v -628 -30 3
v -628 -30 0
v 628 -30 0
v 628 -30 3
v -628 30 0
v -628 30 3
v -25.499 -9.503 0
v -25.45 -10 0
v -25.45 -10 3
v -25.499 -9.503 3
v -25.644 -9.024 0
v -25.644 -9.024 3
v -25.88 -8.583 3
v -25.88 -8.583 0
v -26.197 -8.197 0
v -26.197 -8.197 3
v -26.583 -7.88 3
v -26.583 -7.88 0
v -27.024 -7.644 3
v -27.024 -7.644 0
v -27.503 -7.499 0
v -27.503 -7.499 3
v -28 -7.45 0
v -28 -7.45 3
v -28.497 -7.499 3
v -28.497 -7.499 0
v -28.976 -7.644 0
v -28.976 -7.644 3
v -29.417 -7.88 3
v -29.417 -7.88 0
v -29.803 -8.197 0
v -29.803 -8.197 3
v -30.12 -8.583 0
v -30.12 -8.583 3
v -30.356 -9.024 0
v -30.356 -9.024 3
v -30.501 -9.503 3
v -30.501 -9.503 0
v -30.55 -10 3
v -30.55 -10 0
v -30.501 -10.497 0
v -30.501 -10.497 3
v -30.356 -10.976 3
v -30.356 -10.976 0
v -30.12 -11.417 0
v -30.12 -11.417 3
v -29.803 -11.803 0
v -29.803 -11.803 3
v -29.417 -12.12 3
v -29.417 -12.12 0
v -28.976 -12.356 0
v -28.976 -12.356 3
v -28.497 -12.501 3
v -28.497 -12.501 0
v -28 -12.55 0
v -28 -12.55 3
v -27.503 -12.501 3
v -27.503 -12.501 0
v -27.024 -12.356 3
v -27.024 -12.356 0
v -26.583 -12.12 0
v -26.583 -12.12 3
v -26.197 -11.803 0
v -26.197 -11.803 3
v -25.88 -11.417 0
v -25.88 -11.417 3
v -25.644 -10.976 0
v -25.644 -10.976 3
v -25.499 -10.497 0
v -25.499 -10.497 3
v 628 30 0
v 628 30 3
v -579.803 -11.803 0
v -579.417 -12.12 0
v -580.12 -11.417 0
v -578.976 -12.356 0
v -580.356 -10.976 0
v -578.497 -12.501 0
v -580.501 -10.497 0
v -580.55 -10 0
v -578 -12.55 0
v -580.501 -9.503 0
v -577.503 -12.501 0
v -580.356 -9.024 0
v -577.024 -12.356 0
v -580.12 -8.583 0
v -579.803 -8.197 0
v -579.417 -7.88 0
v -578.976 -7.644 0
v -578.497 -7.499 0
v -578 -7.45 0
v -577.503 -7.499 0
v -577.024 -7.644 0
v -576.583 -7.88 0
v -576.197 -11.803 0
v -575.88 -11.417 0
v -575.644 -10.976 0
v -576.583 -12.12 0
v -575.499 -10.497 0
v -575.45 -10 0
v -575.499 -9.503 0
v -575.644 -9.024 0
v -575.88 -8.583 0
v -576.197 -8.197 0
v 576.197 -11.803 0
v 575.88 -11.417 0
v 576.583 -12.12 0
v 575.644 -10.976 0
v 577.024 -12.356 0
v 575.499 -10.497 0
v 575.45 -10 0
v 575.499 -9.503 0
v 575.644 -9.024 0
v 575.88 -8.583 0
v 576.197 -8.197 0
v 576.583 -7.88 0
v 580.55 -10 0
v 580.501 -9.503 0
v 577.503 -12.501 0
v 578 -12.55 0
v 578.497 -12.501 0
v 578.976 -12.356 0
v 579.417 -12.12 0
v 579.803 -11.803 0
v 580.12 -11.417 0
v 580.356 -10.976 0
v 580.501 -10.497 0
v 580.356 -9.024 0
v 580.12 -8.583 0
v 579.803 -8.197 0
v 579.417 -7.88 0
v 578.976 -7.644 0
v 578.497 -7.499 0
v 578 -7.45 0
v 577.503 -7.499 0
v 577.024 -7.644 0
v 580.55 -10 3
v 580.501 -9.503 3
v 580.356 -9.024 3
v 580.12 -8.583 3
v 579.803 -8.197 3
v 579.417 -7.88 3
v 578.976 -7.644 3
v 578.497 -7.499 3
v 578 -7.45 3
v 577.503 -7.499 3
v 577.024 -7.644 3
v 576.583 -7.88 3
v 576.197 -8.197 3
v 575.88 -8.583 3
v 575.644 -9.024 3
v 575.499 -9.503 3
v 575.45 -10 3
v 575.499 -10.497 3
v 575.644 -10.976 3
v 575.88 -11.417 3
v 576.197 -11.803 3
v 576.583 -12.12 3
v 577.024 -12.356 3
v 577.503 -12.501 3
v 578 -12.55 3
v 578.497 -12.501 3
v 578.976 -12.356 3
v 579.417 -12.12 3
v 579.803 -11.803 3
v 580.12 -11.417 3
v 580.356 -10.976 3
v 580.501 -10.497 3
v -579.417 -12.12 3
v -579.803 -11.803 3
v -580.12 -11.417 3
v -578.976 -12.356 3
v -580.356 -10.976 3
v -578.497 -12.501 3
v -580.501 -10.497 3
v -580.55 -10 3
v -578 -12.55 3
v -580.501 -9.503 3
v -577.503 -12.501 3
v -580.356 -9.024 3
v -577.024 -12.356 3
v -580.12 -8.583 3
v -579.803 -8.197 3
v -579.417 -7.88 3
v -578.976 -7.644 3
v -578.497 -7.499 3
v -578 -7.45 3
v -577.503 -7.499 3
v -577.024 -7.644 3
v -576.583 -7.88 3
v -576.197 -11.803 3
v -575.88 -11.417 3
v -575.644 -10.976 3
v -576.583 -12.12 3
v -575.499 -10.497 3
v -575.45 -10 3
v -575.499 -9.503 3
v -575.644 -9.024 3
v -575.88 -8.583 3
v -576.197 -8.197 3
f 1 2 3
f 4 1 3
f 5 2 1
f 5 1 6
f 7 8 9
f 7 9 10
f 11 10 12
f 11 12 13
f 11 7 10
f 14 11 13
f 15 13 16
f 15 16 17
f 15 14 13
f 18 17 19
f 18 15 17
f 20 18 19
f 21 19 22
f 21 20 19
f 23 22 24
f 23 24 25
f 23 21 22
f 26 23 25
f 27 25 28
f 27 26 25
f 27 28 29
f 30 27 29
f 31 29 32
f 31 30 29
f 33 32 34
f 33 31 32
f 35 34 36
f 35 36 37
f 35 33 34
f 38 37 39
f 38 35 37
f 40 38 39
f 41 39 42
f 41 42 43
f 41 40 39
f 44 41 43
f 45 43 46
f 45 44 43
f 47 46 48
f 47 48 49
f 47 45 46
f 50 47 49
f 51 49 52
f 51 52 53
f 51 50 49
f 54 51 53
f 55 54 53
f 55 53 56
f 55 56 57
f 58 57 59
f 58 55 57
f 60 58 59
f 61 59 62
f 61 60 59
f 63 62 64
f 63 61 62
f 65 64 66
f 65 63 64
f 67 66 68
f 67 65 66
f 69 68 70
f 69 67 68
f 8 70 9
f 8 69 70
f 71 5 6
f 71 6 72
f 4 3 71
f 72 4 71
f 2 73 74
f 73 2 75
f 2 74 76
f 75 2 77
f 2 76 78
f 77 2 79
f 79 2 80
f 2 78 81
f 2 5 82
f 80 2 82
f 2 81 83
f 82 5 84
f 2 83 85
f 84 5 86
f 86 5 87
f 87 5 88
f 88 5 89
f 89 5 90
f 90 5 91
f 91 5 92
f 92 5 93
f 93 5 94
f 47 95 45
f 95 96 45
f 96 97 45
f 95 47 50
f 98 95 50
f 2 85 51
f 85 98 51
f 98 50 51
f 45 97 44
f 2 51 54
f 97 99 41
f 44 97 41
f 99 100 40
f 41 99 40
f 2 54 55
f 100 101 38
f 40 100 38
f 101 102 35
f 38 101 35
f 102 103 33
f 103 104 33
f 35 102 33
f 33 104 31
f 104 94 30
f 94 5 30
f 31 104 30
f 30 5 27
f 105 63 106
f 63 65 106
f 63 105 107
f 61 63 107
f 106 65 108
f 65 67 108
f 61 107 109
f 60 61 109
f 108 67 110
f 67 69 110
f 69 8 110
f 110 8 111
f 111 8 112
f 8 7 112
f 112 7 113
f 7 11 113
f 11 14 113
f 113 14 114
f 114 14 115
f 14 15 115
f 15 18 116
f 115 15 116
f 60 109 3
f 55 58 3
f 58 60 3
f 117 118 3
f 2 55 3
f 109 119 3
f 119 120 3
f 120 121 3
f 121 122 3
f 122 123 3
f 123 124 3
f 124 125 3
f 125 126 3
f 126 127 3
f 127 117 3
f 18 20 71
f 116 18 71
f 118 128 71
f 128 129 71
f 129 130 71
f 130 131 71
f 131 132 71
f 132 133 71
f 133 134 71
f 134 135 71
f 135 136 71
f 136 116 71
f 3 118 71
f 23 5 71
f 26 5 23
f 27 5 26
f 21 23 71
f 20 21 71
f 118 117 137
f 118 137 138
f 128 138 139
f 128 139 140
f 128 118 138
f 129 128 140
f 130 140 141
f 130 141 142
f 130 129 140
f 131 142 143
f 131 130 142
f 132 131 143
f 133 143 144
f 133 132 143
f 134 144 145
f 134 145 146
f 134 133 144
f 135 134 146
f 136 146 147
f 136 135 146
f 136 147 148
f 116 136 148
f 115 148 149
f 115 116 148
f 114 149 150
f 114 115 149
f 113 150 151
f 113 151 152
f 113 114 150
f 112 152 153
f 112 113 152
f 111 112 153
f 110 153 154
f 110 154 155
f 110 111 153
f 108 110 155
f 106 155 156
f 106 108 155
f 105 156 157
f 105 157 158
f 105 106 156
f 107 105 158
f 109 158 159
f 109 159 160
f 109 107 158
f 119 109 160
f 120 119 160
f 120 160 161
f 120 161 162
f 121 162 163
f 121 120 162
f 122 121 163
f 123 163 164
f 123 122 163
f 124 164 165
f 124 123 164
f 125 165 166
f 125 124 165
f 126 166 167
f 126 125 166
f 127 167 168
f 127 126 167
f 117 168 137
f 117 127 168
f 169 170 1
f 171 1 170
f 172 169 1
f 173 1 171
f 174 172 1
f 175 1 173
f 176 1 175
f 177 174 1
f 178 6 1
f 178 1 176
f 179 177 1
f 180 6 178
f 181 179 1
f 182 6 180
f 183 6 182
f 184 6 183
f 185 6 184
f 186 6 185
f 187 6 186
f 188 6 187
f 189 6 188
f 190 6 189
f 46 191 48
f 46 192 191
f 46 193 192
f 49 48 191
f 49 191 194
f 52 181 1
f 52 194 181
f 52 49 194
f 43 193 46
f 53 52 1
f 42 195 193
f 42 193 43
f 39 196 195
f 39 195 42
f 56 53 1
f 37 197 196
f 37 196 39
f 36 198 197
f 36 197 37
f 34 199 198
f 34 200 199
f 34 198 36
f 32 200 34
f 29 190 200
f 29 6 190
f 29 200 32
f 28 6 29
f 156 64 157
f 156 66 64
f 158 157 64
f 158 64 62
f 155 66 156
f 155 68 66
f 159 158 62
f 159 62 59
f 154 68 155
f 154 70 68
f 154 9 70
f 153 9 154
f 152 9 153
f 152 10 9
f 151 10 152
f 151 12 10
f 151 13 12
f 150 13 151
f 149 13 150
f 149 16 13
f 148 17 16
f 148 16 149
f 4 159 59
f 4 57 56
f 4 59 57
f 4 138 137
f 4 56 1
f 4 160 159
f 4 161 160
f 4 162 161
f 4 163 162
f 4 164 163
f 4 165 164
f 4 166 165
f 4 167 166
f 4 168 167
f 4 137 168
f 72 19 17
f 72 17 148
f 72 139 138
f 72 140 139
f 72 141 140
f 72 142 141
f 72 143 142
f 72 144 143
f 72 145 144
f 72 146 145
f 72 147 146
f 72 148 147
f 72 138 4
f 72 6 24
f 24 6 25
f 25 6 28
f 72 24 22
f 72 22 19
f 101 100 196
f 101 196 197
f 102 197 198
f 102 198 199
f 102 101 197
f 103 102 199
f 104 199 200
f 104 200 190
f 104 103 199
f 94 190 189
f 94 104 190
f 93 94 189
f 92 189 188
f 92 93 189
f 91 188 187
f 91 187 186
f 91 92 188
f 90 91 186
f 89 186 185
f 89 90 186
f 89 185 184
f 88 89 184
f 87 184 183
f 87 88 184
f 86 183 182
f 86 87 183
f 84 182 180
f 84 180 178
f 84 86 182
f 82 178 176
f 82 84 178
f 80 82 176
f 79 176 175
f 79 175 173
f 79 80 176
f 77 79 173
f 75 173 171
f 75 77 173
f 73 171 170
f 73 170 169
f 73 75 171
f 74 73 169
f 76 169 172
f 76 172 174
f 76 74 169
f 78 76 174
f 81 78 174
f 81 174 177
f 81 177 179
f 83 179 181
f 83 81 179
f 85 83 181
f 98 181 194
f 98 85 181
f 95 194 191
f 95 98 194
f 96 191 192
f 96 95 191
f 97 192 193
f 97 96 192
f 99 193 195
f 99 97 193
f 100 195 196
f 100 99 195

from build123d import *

# Parameters (mm, degrees)
SKETCH1_W           = 1256
SKETCH1_H           = 60
SKETCH1_R           = 2.55
BOSS_EXTRUDE1_DEPTH = 3


with BuildPart() as part:
    # Sketch1 → Boss-Extrude1 (new body)
    with BuildSketch(Plane.XY):
        Rectangle(SKETCH1_W, SKETCH1_H)
        with Locations((-28, -10)):
            Circle(SKETCH1_R, mode=Mode.SUBTRACT)
        with Locations((578, -10)):
            Circle(SKETCH1_R, mode=Mode.SUBTRACT)
        with Locations((-578, -10)):
            Circle(SKETCH1_R, mode=Mode.SUBTRACT)
    extrude(amount=BOSS_EXTRUDE1_DEPTH)


solid = part.part
